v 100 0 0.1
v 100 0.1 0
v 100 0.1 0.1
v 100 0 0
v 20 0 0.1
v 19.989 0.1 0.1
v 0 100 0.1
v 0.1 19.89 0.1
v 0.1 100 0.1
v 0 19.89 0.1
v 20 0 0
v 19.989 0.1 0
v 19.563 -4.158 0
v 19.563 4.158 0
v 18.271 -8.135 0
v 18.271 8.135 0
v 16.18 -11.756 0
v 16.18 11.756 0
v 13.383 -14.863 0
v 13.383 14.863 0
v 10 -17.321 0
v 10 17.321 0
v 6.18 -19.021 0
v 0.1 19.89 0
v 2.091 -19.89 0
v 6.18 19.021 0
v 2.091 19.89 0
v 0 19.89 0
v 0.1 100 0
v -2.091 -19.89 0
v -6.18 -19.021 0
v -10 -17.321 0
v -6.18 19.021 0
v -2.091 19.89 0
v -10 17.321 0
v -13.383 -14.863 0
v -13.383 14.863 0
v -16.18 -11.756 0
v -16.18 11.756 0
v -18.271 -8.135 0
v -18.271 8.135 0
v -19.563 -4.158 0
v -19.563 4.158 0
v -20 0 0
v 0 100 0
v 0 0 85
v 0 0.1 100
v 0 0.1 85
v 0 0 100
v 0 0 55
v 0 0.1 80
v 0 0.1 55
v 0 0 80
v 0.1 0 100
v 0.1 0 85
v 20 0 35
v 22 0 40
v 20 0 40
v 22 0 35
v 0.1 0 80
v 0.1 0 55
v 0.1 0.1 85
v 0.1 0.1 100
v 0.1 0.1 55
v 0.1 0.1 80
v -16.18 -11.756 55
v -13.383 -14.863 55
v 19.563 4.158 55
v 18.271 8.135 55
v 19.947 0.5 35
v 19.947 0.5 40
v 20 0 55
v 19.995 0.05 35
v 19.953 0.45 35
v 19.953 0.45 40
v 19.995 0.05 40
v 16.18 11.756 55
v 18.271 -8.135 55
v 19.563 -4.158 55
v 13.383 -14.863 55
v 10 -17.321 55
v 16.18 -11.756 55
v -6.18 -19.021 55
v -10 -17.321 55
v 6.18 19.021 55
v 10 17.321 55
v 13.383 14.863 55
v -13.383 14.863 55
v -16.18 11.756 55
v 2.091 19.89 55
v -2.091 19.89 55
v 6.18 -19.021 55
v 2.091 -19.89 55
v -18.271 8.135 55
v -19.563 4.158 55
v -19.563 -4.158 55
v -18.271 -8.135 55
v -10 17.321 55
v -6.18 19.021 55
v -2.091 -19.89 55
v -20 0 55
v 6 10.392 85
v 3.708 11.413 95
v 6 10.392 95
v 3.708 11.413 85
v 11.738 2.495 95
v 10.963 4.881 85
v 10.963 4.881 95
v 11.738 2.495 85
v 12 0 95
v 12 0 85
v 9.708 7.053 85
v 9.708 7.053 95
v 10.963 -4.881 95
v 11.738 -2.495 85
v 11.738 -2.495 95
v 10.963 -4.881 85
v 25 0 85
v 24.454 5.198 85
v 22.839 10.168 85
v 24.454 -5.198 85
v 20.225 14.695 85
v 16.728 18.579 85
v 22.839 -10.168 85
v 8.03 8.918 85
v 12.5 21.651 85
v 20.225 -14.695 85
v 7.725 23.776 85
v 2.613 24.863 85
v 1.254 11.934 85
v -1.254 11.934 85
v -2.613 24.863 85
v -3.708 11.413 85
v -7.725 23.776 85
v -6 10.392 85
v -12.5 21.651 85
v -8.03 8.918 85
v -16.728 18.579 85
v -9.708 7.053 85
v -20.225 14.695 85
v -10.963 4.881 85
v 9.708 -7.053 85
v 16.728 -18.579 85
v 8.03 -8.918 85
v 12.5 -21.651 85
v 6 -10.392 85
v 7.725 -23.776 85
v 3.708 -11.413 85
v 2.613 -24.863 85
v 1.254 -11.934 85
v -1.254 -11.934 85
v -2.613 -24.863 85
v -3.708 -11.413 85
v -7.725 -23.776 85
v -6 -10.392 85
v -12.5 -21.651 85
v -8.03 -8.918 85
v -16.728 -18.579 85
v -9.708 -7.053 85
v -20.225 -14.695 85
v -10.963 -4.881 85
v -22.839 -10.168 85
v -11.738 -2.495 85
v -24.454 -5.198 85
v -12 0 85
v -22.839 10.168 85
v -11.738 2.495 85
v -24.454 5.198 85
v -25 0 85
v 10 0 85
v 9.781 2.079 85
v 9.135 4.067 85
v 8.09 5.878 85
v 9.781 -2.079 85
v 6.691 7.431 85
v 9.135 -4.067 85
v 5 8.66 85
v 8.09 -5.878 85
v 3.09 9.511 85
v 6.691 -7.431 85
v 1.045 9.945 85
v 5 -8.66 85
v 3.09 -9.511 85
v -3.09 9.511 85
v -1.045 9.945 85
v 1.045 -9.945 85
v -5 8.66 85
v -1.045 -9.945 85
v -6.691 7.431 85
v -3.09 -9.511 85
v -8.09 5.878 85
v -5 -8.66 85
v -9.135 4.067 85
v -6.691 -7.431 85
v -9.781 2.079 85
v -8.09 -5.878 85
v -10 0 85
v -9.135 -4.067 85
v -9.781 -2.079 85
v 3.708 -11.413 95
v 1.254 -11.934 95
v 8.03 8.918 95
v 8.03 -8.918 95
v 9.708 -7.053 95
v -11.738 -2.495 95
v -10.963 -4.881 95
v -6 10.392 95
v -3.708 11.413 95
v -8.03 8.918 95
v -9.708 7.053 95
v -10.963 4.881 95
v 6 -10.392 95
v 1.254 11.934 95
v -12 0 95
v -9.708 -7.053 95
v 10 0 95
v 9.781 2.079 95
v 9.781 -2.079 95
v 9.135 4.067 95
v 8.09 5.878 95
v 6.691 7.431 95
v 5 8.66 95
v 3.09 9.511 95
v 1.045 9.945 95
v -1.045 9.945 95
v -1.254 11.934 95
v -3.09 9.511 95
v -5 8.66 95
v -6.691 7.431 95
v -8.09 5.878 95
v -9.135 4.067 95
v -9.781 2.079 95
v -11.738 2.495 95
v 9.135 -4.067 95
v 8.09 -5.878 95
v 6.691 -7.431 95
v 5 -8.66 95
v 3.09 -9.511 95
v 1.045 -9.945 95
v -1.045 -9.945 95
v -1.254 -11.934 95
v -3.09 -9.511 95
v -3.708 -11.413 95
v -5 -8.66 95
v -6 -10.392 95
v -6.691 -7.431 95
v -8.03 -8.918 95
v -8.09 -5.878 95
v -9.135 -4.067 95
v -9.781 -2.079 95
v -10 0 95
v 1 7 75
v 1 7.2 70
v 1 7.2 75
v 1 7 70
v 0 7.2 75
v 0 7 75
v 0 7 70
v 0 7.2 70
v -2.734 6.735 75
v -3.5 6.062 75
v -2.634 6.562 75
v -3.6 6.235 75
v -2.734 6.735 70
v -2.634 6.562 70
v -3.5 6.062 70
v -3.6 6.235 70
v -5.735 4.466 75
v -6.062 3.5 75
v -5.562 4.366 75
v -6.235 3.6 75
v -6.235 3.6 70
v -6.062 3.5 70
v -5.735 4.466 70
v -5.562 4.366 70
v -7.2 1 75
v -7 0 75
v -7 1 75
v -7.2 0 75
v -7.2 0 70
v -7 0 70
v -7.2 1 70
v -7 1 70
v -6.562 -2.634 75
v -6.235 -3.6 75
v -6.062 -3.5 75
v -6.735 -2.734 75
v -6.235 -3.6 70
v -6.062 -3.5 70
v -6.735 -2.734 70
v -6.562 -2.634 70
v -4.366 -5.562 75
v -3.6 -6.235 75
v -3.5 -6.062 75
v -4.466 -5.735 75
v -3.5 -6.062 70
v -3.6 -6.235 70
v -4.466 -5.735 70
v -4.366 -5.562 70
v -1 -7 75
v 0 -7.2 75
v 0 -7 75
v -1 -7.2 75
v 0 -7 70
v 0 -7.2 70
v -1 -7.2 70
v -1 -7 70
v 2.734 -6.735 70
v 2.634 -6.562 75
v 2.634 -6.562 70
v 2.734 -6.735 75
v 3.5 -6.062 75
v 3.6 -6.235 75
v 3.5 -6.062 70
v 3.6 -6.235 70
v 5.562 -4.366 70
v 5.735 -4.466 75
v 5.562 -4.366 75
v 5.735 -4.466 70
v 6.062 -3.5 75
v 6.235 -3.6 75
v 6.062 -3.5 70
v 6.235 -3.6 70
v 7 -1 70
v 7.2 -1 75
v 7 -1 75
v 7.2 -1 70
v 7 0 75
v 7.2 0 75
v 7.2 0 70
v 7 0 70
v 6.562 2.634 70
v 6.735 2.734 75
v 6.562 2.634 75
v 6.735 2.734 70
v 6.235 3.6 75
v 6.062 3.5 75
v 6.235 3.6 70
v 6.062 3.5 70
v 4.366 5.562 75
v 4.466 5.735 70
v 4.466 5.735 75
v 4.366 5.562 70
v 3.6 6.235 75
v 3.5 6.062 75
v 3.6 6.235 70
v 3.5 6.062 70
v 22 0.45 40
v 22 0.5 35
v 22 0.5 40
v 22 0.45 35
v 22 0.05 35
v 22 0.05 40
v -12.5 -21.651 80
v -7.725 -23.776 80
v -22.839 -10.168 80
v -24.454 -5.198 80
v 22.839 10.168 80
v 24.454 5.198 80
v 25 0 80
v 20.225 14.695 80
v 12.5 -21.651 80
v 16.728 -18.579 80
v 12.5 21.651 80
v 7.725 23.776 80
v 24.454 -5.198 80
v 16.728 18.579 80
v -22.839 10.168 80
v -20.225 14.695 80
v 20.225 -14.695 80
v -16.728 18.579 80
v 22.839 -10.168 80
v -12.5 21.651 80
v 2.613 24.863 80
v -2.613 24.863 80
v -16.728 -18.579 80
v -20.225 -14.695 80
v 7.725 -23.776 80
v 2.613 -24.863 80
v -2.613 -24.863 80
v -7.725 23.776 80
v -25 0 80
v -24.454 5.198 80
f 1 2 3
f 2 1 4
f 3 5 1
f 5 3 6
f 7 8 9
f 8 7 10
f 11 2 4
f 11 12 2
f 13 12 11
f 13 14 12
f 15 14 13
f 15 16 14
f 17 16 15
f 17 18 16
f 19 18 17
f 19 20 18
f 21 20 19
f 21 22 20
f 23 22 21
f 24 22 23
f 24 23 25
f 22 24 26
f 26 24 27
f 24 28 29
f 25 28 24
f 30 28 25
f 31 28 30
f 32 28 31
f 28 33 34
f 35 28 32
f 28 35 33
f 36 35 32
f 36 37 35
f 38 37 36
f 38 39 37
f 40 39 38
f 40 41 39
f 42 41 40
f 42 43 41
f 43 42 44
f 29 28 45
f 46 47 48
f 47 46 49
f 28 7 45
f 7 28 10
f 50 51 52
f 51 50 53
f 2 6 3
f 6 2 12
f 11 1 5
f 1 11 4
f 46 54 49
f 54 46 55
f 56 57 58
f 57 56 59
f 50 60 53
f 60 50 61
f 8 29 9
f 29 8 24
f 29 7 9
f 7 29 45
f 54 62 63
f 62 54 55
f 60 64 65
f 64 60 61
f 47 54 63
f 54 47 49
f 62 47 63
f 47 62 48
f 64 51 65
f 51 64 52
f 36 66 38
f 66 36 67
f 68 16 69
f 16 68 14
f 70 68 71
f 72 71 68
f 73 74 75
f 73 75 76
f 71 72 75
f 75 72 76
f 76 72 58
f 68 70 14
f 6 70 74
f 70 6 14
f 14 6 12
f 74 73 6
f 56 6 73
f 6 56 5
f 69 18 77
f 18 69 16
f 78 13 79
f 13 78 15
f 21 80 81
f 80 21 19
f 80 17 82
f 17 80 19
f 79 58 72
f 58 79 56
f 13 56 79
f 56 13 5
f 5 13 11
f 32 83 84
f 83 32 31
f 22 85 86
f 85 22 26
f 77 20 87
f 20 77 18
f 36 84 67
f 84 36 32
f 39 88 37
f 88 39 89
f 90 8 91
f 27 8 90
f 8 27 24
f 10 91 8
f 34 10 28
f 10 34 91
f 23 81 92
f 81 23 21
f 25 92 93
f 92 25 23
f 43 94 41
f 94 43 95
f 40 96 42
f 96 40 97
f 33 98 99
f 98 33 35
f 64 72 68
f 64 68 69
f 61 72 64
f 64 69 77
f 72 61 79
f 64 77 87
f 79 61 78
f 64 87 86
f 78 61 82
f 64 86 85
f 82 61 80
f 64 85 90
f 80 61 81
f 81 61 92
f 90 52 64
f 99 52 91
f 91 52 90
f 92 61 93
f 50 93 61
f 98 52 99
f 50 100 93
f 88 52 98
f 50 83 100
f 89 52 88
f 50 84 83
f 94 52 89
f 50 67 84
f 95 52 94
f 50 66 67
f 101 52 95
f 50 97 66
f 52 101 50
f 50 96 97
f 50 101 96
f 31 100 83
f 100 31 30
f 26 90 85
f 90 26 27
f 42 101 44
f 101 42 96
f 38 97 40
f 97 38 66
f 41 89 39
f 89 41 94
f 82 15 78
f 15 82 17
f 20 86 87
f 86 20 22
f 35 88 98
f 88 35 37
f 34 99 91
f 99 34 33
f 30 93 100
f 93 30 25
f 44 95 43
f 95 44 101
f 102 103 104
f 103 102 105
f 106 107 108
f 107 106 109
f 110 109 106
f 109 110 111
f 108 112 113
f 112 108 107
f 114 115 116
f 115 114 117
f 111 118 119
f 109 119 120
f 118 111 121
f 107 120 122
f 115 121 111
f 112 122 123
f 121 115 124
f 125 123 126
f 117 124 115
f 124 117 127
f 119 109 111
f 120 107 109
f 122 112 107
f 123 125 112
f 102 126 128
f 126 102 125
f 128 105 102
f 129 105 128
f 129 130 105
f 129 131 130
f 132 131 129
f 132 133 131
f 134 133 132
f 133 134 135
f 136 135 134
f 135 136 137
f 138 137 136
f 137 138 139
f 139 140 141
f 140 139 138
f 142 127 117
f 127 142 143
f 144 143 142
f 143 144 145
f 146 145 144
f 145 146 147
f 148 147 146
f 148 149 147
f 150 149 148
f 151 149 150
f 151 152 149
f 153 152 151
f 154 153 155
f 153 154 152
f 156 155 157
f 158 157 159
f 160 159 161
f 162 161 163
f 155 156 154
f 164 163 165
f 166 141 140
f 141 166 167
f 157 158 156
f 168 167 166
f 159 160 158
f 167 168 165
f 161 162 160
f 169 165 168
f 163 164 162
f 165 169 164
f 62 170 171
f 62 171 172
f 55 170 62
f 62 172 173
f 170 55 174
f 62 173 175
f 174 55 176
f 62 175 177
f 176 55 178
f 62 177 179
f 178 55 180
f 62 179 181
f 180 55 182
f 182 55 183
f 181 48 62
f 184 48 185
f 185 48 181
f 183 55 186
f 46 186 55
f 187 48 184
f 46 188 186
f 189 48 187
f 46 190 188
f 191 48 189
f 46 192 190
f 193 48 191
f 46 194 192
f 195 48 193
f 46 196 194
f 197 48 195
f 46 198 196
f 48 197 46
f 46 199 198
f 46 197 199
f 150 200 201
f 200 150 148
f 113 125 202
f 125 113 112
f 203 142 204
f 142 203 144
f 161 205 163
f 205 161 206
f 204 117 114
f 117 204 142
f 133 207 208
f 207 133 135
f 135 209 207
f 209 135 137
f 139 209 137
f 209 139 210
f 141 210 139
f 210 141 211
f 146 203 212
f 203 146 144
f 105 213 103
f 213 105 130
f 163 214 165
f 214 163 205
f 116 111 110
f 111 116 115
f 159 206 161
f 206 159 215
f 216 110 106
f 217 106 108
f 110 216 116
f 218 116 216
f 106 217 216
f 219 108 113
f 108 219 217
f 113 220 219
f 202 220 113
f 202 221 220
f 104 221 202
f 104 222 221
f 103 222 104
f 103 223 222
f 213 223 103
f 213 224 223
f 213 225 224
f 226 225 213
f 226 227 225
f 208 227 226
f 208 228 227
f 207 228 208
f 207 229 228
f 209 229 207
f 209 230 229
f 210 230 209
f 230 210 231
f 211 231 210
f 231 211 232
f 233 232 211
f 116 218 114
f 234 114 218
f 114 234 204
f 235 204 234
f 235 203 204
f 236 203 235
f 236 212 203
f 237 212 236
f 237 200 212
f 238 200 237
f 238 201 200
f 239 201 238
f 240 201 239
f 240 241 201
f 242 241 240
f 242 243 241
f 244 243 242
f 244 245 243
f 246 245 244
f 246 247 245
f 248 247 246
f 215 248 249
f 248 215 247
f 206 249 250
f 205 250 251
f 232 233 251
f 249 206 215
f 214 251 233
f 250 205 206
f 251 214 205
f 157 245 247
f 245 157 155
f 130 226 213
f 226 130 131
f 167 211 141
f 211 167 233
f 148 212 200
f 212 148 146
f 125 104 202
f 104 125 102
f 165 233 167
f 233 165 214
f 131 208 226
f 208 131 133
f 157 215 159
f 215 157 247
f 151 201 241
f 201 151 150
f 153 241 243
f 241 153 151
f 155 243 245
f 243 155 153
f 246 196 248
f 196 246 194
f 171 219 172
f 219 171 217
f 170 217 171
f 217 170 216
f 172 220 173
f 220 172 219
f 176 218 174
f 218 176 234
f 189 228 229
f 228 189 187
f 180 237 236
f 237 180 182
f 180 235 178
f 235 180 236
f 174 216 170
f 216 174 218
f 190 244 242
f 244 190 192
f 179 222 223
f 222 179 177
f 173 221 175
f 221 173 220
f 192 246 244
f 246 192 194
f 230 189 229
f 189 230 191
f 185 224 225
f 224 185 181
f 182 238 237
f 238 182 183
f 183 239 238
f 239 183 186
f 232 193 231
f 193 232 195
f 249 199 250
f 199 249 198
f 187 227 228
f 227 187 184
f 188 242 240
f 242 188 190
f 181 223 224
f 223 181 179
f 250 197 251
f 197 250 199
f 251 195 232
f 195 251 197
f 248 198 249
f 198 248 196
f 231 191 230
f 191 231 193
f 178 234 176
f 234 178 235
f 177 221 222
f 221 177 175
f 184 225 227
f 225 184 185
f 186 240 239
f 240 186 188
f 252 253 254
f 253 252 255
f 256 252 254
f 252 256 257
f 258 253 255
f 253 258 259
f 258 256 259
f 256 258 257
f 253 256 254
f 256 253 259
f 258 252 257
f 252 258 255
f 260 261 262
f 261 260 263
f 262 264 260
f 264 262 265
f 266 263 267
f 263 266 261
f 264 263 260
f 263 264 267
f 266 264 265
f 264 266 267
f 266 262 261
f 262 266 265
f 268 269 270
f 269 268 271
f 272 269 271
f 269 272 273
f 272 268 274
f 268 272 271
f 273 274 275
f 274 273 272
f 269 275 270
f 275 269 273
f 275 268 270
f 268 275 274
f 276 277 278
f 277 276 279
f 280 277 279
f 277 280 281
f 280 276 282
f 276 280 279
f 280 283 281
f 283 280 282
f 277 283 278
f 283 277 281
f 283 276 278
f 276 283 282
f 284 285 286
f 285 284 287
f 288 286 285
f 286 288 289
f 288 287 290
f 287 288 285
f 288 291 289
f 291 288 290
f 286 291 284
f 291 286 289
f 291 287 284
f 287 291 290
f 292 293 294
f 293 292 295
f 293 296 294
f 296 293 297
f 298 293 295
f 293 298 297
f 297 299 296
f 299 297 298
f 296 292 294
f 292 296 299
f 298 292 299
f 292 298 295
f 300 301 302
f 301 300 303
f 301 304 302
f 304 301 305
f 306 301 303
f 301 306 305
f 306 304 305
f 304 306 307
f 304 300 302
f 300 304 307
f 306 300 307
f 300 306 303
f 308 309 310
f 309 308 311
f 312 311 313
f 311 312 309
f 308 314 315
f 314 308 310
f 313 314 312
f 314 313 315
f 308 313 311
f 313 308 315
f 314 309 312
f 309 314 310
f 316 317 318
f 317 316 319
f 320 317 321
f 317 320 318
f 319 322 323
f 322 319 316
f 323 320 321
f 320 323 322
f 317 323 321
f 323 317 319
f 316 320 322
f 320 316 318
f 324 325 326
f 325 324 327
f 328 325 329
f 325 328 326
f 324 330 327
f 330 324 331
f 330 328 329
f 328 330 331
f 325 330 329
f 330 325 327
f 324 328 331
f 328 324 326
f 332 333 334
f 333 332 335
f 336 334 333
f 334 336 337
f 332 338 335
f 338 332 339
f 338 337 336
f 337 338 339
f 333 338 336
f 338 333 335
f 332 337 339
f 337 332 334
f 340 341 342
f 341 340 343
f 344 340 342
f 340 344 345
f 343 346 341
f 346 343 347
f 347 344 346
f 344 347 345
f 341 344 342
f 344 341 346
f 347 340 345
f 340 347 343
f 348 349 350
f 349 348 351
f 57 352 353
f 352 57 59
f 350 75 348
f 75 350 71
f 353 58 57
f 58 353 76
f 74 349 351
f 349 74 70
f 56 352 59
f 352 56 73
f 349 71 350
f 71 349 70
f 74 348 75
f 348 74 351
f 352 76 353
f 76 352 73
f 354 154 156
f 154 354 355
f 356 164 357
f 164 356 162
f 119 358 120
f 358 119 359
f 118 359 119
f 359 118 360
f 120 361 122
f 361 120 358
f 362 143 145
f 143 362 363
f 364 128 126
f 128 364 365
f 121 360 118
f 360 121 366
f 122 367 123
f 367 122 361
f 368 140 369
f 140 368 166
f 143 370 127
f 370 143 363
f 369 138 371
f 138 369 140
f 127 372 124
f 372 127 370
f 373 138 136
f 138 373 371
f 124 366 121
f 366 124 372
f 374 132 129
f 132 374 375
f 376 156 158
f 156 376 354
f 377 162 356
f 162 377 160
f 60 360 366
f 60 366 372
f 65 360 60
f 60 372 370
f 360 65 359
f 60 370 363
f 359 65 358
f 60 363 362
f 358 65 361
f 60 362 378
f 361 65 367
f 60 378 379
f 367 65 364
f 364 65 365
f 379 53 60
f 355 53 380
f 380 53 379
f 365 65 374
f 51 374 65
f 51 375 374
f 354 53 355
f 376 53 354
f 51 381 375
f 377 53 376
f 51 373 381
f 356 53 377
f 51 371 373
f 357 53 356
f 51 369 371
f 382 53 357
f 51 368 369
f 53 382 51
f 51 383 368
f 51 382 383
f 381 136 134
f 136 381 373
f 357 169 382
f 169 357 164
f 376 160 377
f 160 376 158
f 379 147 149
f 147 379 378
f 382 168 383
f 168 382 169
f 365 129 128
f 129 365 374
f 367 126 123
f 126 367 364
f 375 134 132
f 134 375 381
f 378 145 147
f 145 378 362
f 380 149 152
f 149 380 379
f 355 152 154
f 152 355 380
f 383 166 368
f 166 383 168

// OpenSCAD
    // Combined Scene

    // Permanent Model
    
    // Permanent Model (Black)
    color([0, 0, 0]) {
        // Your permanent model code here
        cube([100,0.1,0.1], center = false);
        cube([0.1,100,0.1], center = false);
        cube([0.1,0.1,100], center = false);
    }
    

    // Dynamic Model
    cylinder(h = 50, r = 20); // Main body of the bottle

translate([0, 0, 50]) {
    // Gradual neck transition
    for (i = [0 : 5]) {
        cylinder(h = 5, r = 20 - i * 1, center = false);
        translate([0, 0, 5]) {}
    }
}

translate([0, 0, 80]) {
    cylinder(h = 5, r = 25); // Wide flat base for stability
}

// Cap design
translate([0, 0, 85]) {
    difference() {
        cylinder(h = 10, r = 12); // Cap body
        translate([0, 0, -1])
            cylinder(h = 11, r = 10); // Indentation for cap
    }
}

// Textured neck detail
translate([0, 0, 70]) {
    for (i = [0 : 11]) {
        rotate(i * 30) {
            translate([0, 7, 0]) {
                cube([1, 0.2, 5]); // Ribbed texture along the neck
            }
        }
    }
}

// Label area
translate([0, 0, 35]) {
    difference() {
        cube([22, 0.5, 5]); // Label area
        translate([0, 0.05, 0]) 
            cube([22, 0.4, 5]); // Indentation for label
    }
}

// Indentations for detailing
translate([0, 0, 20]) {
    for (i = [0 : 12]) {
        rotate(i * 30) {
            translate([0, 10, 0]) {
                cylinder(h = 2, r = 1, center = true); // Indentations for detailing
            }
        }
    }
}
    
